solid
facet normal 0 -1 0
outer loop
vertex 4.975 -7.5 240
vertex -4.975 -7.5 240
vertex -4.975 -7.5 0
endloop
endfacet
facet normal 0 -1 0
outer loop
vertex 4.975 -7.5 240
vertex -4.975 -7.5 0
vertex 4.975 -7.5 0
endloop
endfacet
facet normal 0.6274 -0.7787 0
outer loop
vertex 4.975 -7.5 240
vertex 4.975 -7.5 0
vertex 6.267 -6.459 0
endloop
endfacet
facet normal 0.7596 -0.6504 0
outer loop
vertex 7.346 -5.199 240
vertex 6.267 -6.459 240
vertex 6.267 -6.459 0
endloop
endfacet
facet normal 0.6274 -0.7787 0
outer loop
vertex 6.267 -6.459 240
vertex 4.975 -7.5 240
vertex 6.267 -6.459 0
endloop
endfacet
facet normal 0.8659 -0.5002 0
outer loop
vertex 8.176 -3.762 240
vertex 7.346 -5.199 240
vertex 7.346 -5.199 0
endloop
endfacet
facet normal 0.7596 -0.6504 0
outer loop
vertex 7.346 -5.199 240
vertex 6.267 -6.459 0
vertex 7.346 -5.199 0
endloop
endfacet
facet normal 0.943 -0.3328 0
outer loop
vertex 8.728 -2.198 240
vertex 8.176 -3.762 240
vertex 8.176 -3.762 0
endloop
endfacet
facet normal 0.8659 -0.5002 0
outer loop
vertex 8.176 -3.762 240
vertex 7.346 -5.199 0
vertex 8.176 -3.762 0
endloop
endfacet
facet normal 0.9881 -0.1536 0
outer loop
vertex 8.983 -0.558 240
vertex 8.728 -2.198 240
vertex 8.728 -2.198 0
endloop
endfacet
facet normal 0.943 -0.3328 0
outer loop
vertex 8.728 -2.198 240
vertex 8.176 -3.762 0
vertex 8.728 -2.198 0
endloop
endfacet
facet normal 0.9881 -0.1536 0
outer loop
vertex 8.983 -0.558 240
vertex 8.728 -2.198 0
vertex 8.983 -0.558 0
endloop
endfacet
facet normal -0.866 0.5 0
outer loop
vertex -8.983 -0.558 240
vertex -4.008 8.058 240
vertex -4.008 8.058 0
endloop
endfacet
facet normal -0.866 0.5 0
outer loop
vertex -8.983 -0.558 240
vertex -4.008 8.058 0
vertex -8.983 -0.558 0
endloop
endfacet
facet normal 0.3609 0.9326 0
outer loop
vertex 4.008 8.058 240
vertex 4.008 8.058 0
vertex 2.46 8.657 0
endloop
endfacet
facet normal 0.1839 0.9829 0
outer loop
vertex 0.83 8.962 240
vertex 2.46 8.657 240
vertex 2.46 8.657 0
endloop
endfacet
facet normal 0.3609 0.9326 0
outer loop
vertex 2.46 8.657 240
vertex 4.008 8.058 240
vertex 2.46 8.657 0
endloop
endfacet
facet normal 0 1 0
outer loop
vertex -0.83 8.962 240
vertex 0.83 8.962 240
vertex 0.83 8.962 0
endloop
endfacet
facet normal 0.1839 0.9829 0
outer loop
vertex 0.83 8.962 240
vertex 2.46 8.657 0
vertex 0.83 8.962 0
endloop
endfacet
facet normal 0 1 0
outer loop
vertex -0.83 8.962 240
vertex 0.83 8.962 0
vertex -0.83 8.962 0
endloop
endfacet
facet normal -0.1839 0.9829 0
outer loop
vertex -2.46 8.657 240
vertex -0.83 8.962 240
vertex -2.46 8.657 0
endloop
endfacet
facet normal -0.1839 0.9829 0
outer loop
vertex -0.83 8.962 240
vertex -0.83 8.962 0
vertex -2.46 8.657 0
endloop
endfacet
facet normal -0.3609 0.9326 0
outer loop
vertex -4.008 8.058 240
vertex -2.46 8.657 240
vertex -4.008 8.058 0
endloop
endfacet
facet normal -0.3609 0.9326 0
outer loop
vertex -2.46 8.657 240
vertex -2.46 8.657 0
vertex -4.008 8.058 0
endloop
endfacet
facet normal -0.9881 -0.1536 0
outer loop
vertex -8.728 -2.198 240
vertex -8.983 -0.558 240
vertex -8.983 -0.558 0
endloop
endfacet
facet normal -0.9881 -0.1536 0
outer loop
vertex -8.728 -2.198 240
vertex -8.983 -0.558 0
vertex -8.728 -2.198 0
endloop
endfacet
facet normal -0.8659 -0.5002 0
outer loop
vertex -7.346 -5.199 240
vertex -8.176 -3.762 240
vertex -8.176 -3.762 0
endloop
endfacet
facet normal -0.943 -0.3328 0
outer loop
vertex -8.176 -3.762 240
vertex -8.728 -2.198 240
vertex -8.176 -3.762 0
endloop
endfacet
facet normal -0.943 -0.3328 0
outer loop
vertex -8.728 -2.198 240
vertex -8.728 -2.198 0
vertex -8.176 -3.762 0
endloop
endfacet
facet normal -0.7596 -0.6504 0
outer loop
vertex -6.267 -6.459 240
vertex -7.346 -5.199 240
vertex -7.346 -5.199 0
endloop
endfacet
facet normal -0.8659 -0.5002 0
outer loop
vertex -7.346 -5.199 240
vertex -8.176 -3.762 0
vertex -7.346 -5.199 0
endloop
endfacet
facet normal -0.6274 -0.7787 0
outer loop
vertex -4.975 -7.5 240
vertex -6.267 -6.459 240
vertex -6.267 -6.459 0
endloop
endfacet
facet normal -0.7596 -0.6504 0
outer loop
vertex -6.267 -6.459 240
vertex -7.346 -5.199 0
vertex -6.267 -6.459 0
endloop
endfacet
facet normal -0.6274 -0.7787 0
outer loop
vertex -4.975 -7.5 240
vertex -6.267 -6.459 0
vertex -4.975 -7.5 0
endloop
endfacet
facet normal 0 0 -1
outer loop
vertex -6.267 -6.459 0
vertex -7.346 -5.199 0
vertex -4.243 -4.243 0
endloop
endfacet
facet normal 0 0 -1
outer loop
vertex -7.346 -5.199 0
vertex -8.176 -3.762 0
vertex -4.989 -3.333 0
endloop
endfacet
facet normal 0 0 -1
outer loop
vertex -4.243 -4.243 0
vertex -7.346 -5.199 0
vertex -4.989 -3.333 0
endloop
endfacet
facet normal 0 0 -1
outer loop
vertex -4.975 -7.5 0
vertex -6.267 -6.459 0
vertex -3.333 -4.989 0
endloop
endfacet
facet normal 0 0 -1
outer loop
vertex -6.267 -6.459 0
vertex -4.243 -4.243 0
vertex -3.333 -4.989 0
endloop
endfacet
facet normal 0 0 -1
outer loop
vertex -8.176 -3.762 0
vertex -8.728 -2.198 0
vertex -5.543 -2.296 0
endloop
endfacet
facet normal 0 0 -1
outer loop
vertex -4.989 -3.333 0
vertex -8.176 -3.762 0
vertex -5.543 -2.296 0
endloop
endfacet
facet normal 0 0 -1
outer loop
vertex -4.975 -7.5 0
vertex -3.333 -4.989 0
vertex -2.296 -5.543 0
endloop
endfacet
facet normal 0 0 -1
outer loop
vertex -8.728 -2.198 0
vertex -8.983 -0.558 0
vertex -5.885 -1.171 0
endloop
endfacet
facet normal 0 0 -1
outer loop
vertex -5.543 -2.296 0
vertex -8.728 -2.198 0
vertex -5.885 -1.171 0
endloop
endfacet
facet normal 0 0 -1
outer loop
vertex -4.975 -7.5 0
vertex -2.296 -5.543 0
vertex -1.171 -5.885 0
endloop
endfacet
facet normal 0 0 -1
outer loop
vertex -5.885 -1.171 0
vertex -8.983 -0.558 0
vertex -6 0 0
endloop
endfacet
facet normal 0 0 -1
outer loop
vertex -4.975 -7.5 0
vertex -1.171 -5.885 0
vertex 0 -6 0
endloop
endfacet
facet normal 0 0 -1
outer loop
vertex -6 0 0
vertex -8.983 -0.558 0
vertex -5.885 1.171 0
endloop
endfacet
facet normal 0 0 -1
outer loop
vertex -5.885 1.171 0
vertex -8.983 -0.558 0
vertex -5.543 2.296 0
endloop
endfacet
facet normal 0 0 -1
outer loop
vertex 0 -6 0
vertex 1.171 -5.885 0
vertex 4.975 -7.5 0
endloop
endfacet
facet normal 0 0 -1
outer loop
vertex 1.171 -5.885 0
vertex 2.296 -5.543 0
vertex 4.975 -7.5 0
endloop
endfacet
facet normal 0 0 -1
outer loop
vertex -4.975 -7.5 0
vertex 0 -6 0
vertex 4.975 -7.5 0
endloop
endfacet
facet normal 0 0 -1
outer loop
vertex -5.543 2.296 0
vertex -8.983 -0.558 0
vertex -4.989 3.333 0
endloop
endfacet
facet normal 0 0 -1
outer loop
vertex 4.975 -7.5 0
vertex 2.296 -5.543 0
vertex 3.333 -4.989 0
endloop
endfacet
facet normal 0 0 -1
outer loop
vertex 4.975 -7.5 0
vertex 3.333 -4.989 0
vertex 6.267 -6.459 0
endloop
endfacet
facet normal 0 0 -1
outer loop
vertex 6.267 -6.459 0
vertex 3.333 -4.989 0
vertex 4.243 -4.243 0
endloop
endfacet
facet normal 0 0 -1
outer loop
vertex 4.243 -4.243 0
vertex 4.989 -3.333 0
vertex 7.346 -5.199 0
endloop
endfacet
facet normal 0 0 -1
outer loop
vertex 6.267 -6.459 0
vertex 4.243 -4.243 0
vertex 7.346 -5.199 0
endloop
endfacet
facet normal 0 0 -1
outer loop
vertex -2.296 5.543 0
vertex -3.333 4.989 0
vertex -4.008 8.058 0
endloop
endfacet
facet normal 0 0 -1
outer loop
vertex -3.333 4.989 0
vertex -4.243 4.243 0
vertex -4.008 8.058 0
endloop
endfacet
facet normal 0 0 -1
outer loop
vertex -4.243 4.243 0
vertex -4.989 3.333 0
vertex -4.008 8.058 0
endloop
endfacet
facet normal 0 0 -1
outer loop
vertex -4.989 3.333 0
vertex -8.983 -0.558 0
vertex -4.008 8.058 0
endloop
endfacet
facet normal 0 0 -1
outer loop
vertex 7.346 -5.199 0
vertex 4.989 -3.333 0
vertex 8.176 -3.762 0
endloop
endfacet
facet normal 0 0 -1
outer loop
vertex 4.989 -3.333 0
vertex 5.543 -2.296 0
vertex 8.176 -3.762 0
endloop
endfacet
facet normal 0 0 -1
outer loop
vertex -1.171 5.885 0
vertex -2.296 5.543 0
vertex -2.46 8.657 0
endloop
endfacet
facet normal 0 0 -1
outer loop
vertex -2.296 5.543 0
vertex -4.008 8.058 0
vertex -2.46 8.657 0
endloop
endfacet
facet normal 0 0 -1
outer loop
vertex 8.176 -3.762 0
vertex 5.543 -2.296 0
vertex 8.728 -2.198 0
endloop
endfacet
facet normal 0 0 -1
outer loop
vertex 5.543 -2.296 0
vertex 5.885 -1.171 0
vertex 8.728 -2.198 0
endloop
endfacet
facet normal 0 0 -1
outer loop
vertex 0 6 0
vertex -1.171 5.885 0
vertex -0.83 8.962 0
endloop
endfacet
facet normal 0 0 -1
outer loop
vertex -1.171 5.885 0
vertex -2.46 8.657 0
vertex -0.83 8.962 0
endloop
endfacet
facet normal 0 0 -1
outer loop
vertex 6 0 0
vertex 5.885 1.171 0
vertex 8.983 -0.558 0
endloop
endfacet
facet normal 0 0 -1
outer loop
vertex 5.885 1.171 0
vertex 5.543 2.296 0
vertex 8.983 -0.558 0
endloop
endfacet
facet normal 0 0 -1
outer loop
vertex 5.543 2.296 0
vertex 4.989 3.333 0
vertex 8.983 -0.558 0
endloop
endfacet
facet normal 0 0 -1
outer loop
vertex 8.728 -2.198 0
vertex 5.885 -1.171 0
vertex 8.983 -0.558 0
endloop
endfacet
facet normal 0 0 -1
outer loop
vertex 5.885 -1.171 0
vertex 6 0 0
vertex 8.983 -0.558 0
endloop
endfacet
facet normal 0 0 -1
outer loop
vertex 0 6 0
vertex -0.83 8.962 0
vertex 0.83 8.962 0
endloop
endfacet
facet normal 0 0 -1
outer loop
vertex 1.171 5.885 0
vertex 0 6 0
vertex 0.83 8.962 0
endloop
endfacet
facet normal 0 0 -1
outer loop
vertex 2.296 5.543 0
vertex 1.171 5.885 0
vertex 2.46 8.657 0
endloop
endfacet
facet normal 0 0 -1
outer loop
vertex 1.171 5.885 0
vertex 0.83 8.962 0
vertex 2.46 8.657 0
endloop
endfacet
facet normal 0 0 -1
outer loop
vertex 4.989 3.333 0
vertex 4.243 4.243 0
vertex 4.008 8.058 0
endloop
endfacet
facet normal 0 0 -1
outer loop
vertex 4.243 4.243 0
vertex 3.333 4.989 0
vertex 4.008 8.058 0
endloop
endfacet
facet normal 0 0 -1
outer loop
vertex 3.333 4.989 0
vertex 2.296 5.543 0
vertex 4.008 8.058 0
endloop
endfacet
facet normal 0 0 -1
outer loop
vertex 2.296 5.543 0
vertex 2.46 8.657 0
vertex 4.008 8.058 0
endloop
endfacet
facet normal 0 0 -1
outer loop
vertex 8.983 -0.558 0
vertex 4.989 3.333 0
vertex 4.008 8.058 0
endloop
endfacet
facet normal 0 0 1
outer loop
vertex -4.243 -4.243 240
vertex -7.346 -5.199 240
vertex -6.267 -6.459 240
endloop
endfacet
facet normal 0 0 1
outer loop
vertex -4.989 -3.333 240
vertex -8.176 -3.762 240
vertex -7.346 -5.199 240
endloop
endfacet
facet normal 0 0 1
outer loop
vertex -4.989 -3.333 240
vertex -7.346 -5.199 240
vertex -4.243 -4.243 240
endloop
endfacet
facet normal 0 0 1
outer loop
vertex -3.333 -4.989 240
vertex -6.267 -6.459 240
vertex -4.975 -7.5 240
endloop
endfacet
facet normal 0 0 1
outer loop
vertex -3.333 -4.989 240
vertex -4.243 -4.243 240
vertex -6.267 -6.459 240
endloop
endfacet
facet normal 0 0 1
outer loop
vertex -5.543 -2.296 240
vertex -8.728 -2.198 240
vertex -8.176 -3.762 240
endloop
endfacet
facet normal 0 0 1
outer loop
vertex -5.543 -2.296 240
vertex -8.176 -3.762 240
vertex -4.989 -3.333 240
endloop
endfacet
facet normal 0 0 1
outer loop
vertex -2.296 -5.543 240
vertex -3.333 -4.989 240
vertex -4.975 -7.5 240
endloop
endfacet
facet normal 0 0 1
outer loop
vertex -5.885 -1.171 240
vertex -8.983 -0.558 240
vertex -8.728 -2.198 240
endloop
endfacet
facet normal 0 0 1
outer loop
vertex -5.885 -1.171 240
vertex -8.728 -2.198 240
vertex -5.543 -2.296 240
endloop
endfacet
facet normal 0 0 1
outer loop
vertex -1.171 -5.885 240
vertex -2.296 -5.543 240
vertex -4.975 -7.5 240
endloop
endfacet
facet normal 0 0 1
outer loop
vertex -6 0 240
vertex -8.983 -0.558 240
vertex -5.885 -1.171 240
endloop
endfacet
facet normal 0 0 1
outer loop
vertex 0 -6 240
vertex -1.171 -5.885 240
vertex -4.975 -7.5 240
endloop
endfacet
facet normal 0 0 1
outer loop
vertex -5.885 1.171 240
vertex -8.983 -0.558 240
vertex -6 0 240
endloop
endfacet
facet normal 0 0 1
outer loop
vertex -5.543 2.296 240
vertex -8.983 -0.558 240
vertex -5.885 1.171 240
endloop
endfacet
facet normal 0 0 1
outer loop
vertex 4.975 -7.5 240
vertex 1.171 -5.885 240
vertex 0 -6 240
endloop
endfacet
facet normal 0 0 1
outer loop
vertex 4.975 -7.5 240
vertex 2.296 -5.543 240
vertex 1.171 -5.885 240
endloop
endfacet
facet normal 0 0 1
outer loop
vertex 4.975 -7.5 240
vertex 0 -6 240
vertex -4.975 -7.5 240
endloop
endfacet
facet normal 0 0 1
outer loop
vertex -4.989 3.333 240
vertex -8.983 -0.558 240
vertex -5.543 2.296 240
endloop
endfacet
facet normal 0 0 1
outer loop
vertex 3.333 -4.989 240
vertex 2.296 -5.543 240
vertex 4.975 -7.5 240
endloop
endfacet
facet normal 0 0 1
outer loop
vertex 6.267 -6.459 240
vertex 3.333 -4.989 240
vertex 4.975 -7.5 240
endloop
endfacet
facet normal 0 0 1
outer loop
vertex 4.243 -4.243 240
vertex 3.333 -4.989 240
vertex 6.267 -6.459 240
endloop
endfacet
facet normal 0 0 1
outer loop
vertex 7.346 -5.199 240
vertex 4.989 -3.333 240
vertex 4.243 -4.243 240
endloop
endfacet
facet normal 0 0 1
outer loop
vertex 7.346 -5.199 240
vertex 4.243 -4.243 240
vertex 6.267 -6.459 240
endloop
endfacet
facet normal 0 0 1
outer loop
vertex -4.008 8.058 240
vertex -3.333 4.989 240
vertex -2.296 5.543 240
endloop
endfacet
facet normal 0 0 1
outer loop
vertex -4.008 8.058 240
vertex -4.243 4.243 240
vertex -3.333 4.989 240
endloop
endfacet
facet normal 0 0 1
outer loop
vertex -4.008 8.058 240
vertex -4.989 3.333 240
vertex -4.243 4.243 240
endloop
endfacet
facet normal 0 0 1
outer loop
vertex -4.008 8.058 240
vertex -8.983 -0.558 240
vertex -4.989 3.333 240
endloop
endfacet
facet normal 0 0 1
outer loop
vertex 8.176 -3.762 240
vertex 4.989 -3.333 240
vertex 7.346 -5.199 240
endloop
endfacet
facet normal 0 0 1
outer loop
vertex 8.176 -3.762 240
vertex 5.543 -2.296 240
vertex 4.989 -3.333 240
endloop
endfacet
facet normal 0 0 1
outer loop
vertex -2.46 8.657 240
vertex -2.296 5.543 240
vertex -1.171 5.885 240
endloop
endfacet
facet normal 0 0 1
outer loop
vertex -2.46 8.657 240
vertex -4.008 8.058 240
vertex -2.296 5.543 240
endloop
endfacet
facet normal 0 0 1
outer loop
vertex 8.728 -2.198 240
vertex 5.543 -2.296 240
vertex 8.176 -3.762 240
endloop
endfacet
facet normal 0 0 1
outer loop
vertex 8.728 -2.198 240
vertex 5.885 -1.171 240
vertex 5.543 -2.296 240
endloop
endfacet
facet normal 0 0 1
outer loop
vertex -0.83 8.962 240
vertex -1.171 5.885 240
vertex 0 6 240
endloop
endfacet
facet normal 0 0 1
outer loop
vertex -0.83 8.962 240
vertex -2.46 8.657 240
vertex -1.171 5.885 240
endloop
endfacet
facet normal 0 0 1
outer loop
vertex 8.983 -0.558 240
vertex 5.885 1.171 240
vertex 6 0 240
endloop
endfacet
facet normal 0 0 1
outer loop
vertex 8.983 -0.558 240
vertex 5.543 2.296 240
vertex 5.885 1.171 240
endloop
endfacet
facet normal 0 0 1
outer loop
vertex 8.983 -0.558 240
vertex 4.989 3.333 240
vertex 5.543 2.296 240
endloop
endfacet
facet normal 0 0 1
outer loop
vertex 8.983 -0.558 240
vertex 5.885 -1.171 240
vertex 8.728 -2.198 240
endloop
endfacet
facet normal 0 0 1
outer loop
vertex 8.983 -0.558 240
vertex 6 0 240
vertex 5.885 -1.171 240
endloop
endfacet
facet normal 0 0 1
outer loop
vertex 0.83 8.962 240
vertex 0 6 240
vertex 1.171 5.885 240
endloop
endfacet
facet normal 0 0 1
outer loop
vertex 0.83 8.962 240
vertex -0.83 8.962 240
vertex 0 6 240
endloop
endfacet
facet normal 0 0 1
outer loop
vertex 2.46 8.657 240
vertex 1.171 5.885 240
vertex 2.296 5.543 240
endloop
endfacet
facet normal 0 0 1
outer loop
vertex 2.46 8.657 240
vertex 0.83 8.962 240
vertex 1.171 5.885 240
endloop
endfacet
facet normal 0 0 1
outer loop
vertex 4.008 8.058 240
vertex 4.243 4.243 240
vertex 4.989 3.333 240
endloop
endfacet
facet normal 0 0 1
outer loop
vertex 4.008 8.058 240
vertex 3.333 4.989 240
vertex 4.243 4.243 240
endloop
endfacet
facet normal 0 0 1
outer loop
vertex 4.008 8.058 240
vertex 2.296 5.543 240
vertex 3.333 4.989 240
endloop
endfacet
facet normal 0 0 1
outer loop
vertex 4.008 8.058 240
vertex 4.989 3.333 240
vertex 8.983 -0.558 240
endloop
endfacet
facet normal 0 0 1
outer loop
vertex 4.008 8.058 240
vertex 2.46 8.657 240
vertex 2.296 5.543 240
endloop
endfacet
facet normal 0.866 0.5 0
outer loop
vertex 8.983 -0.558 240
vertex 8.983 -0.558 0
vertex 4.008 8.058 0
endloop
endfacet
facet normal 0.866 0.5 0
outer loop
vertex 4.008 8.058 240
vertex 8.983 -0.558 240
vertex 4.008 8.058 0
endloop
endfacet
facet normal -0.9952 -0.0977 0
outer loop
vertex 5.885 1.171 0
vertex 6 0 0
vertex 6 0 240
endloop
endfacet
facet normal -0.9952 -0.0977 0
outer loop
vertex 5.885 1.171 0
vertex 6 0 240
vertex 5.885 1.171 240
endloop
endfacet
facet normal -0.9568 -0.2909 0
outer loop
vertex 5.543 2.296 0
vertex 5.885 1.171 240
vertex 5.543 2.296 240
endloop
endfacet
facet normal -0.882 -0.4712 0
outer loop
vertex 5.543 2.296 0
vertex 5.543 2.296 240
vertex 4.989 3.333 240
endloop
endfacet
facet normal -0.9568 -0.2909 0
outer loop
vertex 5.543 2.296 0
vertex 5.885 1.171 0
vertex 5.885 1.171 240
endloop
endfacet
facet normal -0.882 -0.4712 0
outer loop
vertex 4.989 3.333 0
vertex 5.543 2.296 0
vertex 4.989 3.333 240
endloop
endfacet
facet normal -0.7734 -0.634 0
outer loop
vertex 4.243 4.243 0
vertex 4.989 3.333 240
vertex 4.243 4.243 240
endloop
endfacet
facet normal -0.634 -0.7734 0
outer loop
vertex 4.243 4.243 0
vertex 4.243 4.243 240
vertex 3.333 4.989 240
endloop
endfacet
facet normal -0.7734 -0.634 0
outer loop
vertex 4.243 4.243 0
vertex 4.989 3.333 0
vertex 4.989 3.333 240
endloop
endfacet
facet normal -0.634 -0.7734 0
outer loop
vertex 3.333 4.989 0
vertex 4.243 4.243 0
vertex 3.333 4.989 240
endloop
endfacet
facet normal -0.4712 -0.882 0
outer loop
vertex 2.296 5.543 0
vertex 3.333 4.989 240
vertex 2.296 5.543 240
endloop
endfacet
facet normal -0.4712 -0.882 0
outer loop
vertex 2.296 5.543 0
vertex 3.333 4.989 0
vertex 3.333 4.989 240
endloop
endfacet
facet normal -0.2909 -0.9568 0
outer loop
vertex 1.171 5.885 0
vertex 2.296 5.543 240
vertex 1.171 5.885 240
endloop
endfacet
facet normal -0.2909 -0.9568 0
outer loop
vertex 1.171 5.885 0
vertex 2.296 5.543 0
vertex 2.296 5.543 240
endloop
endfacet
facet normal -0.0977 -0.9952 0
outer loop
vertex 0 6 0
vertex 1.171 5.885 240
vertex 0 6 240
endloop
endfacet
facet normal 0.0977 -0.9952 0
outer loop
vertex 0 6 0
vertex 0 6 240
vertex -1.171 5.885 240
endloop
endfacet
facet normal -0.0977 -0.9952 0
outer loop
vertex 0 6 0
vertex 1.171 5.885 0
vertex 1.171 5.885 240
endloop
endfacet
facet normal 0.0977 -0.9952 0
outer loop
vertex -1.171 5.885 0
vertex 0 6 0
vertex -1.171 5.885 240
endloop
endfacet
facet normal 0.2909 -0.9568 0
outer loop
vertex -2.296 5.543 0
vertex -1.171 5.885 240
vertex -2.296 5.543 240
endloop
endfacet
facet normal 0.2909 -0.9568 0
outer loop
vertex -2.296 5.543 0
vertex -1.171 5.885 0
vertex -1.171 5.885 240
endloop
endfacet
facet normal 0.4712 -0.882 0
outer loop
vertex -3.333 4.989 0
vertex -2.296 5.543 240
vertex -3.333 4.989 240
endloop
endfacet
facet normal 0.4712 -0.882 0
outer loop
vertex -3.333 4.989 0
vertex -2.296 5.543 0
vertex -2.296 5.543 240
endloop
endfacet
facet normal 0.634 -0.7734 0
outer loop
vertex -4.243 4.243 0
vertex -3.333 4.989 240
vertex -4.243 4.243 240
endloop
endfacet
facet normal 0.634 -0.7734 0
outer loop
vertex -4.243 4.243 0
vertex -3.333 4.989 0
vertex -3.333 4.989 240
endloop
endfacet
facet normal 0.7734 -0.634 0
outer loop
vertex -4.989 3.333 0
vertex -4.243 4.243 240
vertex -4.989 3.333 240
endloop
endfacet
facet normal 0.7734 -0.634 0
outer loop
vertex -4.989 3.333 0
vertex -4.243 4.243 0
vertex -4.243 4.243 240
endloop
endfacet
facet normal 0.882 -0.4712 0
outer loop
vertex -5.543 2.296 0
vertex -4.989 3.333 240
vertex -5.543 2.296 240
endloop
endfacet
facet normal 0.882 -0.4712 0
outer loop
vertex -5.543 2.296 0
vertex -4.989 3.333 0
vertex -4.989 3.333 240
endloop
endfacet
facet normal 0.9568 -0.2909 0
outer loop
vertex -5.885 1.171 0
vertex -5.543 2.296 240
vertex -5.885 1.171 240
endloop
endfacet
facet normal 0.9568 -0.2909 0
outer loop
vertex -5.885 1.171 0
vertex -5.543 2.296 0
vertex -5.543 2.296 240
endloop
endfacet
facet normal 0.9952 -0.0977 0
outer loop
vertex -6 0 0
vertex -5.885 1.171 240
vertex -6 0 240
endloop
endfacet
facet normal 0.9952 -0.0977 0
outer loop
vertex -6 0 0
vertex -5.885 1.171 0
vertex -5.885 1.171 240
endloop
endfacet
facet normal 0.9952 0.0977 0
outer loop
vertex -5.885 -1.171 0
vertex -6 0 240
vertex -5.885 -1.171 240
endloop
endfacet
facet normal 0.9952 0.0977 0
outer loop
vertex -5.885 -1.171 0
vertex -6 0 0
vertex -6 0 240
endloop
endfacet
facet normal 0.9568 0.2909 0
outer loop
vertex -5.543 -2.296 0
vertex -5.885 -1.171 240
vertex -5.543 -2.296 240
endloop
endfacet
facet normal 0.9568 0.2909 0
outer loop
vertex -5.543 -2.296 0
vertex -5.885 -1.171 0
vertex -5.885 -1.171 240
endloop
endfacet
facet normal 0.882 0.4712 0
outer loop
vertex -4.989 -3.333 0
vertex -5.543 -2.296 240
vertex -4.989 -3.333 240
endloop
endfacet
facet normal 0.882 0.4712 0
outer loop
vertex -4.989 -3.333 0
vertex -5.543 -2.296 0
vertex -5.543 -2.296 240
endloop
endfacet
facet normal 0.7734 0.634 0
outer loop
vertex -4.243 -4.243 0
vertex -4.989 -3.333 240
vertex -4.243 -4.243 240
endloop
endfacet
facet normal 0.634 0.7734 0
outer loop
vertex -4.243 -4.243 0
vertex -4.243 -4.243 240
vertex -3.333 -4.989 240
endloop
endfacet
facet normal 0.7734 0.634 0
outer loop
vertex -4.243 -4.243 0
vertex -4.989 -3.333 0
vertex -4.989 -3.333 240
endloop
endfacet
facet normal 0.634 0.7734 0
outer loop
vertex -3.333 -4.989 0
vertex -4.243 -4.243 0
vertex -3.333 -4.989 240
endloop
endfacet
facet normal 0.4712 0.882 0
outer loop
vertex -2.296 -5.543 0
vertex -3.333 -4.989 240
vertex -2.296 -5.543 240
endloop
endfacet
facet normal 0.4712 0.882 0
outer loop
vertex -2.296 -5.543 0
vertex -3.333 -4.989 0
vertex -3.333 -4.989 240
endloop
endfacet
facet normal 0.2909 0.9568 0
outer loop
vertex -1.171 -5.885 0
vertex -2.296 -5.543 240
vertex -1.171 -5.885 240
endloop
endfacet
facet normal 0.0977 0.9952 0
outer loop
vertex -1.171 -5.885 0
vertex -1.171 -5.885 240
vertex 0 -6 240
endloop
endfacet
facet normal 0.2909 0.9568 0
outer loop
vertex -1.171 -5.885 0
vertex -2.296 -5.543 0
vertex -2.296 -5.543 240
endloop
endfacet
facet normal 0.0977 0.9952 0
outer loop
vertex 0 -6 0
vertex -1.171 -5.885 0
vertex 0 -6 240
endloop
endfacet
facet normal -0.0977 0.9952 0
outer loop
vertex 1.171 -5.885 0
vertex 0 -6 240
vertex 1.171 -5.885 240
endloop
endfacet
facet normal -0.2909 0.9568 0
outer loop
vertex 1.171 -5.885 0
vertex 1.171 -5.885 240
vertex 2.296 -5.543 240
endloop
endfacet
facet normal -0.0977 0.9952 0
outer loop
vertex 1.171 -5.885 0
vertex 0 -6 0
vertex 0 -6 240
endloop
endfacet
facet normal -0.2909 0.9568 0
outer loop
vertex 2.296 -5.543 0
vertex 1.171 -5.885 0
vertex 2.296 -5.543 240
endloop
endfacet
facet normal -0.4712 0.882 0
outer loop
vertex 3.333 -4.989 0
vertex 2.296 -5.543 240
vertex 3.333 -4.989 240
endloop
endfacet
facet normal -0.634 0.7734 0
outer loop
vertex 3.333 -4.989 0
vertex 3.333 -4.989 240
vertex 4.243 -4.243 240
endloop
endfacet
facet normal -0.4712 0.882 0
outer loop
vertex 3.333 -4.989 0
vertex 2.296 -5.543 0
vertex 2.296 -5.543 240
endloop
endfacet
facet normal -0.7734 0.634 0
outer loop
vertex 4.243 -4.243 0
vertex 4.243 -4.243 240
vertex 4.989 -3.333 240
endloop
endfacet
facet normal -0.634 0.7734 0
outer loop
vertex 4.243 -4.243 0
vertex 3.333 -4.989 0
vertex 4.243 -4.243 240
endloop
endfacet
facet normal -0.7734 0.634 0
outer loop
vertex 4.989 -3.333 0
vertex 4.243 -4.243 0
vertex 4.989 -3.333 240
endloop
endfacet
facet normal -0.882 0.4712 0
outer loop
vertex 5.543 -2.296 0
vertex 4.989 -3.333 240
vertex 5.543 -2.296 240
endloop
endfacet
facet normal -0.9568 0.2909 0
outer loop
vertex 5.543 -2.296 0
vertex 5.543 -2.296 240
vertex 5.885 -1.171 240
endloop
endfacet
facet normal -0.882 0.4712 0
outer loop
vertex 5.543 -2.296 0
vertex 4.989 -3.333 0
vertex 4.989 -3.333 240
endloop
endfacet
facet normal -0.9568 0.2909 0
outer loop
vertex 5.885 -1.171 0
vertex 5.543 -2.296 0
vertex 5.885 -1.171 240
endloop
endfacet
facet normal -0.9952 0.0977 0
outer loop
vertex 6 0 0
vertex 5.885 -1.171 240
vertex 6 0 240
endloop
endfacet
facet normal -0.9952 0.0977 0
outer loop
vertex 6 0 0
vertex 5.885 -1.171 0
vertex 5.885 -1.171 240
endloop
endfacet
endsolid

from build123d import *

# Parameters (mm, degrees)
F0_R            = 9
F0_R_2          = 6
F1_DEPTH        = 240
F3_W            = 18
F3_H            = 240
F4_DEPTH        = 1.5
F4_COPIES_COUNT = 3


# Not quite as in the source:
# - a pattern or mirror of a feature is missing from the dataset's text; its kind, count and spacing are read off the source's solid


with BuildPart() as f1:
    # F0 (on Top) → F1 (new body)
    with BuildSketch(Plane.XY):
        Circle(F0_R)
        Circle(F0_R_2, mode=Mode.SUBTRACT)
    extrude(amount=F1_DEPTH)

    # F3 (on offset) → F4 (cut)
    with BuildSketch(Plane.XZ.offset(9)):
        with Locations((0, 120)):
            Rectangle(F3_W, F3_H)
    f4 = extrude(amount=-F4_DEPTH, mode=Mode.SUBTRACT)

    # F4_copies: F4 ×3 about axis
    f4_copies_axis = Axis((0, 0, 0), (0, 0, 1))
    for i in range(1, F4_COPIES_COUNT):
        add(f4.rotate(f4_copies_axis, i * 360 / F4_COPIES_COUNT), mode=Mode.SUBTRACT)


solid = f1.part
